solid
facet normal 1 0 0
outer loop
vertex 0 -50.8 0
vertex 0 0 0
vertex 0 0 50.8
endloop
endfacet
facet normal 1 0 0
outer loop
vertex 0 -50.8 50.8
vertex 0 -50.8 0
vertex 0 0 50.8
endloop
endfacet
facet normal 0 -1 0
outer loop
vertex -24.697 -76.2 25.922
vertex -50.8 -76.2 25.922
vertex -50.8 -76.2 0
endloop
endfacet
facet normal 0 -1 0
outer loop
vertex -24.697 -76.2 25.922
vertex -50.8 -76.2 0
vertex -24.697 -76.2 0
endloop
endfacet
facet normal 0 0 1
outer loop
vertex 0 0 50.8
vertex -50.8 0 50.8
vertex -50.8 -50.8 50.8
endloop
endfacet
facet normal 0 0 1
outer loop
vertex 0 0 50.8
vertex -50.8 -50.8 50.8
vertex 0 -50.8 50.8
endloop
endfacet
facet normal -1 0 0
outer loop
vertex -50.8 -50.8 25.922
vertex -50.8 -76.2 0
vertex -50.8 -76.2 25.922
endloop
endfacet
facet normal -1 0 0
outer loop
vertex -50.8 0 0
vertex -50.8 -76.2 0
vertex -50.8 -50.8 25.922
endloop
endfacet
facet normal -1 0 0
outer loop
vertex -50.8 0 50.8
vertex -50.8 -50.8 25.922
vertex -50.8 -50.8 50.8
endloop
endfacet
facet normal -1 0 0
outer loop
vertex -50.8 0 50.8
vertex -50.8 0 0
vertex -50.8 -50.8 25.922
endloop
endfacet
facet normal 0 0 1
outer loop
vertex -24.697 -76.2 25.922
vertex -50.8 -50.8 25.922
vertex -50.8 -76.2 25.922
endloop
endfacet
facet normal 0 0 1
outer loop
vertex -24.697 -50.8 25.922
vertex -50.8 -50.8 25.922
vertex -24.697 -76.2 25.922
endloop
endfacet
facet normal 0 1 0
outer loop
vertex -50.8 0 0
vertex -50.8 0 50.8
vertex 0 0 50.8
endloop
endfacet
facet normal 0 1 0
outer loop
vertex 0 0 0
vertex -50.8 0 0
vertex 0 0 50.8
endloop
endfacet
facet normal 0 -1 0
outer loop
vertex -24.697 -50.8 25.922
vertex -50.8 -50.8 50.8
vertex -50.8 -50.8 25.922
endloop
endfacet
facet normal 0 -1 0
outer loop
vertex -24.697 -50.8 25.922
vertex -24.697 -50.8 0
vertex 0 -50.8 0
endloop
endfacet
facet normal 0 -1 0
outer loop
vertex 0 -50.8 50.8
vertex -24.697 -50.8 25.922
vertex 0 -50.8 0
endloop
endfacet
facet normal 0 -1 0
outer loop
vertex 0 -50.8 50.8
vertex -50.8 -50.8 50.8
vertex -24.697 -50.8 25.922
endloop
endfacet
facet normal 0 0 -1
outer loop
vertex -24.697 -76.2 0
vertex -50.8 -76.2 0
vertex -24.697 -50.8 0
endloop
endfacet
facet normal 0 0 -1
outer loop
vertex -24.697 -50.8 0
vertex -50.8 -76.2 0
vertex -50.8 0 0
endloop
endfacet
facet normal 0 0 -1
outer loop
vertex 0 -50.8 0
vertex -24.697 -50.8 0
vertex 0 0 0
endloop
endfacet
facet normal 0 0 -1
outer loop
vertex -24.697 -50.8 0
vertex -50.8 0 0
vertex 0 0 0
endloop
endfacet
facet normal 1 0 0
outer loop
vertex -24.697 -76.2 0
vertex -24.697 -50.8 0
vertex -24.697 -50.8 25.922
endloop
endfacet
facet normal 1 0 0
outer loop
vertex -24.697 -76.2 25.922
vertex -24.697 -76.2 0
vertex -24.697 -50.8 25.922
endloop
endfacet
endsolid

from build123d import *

# Parameters (mm, degrees)
F0_W     = 50.8
F0_H     = 50.8
F1_DEPTH = 50.8
F2_W     = 26.1030352294
F2_H     = 25.92160739
F3_DEPTH = 50.8
F4_DEPTH = 25.4


with BuildPart() as f1:
    # F0 (on Front) → F1 (new body)
    with BuildSketch(Plane.XZ):
        with Locations((-25.4, 25.4)):
            Rectangle(F0_W, F0_H)
    extrude(amount=F1_DEPTH)

    # F2 (on face) → F3 (join)
    with BuildSketch(Plane.XZ.offset(50.8)):
        with Locations((-37.7484823853, 12.960803695)):
            Rectangle(F2_W, F2_H)
    extrude(amount=F3_DEPTH)

    # F4 (cut): a face of the model
    f4_faces = [f1.faces().sort_by_distance(p)[0] for p in [
        (-37.7484823853, -101.6, 12.960803695),
    ]]
    extrude(f4_faces, amount=-F4_DEPTH, mode=Mode.SUBTRACT)


solid = f1.part
